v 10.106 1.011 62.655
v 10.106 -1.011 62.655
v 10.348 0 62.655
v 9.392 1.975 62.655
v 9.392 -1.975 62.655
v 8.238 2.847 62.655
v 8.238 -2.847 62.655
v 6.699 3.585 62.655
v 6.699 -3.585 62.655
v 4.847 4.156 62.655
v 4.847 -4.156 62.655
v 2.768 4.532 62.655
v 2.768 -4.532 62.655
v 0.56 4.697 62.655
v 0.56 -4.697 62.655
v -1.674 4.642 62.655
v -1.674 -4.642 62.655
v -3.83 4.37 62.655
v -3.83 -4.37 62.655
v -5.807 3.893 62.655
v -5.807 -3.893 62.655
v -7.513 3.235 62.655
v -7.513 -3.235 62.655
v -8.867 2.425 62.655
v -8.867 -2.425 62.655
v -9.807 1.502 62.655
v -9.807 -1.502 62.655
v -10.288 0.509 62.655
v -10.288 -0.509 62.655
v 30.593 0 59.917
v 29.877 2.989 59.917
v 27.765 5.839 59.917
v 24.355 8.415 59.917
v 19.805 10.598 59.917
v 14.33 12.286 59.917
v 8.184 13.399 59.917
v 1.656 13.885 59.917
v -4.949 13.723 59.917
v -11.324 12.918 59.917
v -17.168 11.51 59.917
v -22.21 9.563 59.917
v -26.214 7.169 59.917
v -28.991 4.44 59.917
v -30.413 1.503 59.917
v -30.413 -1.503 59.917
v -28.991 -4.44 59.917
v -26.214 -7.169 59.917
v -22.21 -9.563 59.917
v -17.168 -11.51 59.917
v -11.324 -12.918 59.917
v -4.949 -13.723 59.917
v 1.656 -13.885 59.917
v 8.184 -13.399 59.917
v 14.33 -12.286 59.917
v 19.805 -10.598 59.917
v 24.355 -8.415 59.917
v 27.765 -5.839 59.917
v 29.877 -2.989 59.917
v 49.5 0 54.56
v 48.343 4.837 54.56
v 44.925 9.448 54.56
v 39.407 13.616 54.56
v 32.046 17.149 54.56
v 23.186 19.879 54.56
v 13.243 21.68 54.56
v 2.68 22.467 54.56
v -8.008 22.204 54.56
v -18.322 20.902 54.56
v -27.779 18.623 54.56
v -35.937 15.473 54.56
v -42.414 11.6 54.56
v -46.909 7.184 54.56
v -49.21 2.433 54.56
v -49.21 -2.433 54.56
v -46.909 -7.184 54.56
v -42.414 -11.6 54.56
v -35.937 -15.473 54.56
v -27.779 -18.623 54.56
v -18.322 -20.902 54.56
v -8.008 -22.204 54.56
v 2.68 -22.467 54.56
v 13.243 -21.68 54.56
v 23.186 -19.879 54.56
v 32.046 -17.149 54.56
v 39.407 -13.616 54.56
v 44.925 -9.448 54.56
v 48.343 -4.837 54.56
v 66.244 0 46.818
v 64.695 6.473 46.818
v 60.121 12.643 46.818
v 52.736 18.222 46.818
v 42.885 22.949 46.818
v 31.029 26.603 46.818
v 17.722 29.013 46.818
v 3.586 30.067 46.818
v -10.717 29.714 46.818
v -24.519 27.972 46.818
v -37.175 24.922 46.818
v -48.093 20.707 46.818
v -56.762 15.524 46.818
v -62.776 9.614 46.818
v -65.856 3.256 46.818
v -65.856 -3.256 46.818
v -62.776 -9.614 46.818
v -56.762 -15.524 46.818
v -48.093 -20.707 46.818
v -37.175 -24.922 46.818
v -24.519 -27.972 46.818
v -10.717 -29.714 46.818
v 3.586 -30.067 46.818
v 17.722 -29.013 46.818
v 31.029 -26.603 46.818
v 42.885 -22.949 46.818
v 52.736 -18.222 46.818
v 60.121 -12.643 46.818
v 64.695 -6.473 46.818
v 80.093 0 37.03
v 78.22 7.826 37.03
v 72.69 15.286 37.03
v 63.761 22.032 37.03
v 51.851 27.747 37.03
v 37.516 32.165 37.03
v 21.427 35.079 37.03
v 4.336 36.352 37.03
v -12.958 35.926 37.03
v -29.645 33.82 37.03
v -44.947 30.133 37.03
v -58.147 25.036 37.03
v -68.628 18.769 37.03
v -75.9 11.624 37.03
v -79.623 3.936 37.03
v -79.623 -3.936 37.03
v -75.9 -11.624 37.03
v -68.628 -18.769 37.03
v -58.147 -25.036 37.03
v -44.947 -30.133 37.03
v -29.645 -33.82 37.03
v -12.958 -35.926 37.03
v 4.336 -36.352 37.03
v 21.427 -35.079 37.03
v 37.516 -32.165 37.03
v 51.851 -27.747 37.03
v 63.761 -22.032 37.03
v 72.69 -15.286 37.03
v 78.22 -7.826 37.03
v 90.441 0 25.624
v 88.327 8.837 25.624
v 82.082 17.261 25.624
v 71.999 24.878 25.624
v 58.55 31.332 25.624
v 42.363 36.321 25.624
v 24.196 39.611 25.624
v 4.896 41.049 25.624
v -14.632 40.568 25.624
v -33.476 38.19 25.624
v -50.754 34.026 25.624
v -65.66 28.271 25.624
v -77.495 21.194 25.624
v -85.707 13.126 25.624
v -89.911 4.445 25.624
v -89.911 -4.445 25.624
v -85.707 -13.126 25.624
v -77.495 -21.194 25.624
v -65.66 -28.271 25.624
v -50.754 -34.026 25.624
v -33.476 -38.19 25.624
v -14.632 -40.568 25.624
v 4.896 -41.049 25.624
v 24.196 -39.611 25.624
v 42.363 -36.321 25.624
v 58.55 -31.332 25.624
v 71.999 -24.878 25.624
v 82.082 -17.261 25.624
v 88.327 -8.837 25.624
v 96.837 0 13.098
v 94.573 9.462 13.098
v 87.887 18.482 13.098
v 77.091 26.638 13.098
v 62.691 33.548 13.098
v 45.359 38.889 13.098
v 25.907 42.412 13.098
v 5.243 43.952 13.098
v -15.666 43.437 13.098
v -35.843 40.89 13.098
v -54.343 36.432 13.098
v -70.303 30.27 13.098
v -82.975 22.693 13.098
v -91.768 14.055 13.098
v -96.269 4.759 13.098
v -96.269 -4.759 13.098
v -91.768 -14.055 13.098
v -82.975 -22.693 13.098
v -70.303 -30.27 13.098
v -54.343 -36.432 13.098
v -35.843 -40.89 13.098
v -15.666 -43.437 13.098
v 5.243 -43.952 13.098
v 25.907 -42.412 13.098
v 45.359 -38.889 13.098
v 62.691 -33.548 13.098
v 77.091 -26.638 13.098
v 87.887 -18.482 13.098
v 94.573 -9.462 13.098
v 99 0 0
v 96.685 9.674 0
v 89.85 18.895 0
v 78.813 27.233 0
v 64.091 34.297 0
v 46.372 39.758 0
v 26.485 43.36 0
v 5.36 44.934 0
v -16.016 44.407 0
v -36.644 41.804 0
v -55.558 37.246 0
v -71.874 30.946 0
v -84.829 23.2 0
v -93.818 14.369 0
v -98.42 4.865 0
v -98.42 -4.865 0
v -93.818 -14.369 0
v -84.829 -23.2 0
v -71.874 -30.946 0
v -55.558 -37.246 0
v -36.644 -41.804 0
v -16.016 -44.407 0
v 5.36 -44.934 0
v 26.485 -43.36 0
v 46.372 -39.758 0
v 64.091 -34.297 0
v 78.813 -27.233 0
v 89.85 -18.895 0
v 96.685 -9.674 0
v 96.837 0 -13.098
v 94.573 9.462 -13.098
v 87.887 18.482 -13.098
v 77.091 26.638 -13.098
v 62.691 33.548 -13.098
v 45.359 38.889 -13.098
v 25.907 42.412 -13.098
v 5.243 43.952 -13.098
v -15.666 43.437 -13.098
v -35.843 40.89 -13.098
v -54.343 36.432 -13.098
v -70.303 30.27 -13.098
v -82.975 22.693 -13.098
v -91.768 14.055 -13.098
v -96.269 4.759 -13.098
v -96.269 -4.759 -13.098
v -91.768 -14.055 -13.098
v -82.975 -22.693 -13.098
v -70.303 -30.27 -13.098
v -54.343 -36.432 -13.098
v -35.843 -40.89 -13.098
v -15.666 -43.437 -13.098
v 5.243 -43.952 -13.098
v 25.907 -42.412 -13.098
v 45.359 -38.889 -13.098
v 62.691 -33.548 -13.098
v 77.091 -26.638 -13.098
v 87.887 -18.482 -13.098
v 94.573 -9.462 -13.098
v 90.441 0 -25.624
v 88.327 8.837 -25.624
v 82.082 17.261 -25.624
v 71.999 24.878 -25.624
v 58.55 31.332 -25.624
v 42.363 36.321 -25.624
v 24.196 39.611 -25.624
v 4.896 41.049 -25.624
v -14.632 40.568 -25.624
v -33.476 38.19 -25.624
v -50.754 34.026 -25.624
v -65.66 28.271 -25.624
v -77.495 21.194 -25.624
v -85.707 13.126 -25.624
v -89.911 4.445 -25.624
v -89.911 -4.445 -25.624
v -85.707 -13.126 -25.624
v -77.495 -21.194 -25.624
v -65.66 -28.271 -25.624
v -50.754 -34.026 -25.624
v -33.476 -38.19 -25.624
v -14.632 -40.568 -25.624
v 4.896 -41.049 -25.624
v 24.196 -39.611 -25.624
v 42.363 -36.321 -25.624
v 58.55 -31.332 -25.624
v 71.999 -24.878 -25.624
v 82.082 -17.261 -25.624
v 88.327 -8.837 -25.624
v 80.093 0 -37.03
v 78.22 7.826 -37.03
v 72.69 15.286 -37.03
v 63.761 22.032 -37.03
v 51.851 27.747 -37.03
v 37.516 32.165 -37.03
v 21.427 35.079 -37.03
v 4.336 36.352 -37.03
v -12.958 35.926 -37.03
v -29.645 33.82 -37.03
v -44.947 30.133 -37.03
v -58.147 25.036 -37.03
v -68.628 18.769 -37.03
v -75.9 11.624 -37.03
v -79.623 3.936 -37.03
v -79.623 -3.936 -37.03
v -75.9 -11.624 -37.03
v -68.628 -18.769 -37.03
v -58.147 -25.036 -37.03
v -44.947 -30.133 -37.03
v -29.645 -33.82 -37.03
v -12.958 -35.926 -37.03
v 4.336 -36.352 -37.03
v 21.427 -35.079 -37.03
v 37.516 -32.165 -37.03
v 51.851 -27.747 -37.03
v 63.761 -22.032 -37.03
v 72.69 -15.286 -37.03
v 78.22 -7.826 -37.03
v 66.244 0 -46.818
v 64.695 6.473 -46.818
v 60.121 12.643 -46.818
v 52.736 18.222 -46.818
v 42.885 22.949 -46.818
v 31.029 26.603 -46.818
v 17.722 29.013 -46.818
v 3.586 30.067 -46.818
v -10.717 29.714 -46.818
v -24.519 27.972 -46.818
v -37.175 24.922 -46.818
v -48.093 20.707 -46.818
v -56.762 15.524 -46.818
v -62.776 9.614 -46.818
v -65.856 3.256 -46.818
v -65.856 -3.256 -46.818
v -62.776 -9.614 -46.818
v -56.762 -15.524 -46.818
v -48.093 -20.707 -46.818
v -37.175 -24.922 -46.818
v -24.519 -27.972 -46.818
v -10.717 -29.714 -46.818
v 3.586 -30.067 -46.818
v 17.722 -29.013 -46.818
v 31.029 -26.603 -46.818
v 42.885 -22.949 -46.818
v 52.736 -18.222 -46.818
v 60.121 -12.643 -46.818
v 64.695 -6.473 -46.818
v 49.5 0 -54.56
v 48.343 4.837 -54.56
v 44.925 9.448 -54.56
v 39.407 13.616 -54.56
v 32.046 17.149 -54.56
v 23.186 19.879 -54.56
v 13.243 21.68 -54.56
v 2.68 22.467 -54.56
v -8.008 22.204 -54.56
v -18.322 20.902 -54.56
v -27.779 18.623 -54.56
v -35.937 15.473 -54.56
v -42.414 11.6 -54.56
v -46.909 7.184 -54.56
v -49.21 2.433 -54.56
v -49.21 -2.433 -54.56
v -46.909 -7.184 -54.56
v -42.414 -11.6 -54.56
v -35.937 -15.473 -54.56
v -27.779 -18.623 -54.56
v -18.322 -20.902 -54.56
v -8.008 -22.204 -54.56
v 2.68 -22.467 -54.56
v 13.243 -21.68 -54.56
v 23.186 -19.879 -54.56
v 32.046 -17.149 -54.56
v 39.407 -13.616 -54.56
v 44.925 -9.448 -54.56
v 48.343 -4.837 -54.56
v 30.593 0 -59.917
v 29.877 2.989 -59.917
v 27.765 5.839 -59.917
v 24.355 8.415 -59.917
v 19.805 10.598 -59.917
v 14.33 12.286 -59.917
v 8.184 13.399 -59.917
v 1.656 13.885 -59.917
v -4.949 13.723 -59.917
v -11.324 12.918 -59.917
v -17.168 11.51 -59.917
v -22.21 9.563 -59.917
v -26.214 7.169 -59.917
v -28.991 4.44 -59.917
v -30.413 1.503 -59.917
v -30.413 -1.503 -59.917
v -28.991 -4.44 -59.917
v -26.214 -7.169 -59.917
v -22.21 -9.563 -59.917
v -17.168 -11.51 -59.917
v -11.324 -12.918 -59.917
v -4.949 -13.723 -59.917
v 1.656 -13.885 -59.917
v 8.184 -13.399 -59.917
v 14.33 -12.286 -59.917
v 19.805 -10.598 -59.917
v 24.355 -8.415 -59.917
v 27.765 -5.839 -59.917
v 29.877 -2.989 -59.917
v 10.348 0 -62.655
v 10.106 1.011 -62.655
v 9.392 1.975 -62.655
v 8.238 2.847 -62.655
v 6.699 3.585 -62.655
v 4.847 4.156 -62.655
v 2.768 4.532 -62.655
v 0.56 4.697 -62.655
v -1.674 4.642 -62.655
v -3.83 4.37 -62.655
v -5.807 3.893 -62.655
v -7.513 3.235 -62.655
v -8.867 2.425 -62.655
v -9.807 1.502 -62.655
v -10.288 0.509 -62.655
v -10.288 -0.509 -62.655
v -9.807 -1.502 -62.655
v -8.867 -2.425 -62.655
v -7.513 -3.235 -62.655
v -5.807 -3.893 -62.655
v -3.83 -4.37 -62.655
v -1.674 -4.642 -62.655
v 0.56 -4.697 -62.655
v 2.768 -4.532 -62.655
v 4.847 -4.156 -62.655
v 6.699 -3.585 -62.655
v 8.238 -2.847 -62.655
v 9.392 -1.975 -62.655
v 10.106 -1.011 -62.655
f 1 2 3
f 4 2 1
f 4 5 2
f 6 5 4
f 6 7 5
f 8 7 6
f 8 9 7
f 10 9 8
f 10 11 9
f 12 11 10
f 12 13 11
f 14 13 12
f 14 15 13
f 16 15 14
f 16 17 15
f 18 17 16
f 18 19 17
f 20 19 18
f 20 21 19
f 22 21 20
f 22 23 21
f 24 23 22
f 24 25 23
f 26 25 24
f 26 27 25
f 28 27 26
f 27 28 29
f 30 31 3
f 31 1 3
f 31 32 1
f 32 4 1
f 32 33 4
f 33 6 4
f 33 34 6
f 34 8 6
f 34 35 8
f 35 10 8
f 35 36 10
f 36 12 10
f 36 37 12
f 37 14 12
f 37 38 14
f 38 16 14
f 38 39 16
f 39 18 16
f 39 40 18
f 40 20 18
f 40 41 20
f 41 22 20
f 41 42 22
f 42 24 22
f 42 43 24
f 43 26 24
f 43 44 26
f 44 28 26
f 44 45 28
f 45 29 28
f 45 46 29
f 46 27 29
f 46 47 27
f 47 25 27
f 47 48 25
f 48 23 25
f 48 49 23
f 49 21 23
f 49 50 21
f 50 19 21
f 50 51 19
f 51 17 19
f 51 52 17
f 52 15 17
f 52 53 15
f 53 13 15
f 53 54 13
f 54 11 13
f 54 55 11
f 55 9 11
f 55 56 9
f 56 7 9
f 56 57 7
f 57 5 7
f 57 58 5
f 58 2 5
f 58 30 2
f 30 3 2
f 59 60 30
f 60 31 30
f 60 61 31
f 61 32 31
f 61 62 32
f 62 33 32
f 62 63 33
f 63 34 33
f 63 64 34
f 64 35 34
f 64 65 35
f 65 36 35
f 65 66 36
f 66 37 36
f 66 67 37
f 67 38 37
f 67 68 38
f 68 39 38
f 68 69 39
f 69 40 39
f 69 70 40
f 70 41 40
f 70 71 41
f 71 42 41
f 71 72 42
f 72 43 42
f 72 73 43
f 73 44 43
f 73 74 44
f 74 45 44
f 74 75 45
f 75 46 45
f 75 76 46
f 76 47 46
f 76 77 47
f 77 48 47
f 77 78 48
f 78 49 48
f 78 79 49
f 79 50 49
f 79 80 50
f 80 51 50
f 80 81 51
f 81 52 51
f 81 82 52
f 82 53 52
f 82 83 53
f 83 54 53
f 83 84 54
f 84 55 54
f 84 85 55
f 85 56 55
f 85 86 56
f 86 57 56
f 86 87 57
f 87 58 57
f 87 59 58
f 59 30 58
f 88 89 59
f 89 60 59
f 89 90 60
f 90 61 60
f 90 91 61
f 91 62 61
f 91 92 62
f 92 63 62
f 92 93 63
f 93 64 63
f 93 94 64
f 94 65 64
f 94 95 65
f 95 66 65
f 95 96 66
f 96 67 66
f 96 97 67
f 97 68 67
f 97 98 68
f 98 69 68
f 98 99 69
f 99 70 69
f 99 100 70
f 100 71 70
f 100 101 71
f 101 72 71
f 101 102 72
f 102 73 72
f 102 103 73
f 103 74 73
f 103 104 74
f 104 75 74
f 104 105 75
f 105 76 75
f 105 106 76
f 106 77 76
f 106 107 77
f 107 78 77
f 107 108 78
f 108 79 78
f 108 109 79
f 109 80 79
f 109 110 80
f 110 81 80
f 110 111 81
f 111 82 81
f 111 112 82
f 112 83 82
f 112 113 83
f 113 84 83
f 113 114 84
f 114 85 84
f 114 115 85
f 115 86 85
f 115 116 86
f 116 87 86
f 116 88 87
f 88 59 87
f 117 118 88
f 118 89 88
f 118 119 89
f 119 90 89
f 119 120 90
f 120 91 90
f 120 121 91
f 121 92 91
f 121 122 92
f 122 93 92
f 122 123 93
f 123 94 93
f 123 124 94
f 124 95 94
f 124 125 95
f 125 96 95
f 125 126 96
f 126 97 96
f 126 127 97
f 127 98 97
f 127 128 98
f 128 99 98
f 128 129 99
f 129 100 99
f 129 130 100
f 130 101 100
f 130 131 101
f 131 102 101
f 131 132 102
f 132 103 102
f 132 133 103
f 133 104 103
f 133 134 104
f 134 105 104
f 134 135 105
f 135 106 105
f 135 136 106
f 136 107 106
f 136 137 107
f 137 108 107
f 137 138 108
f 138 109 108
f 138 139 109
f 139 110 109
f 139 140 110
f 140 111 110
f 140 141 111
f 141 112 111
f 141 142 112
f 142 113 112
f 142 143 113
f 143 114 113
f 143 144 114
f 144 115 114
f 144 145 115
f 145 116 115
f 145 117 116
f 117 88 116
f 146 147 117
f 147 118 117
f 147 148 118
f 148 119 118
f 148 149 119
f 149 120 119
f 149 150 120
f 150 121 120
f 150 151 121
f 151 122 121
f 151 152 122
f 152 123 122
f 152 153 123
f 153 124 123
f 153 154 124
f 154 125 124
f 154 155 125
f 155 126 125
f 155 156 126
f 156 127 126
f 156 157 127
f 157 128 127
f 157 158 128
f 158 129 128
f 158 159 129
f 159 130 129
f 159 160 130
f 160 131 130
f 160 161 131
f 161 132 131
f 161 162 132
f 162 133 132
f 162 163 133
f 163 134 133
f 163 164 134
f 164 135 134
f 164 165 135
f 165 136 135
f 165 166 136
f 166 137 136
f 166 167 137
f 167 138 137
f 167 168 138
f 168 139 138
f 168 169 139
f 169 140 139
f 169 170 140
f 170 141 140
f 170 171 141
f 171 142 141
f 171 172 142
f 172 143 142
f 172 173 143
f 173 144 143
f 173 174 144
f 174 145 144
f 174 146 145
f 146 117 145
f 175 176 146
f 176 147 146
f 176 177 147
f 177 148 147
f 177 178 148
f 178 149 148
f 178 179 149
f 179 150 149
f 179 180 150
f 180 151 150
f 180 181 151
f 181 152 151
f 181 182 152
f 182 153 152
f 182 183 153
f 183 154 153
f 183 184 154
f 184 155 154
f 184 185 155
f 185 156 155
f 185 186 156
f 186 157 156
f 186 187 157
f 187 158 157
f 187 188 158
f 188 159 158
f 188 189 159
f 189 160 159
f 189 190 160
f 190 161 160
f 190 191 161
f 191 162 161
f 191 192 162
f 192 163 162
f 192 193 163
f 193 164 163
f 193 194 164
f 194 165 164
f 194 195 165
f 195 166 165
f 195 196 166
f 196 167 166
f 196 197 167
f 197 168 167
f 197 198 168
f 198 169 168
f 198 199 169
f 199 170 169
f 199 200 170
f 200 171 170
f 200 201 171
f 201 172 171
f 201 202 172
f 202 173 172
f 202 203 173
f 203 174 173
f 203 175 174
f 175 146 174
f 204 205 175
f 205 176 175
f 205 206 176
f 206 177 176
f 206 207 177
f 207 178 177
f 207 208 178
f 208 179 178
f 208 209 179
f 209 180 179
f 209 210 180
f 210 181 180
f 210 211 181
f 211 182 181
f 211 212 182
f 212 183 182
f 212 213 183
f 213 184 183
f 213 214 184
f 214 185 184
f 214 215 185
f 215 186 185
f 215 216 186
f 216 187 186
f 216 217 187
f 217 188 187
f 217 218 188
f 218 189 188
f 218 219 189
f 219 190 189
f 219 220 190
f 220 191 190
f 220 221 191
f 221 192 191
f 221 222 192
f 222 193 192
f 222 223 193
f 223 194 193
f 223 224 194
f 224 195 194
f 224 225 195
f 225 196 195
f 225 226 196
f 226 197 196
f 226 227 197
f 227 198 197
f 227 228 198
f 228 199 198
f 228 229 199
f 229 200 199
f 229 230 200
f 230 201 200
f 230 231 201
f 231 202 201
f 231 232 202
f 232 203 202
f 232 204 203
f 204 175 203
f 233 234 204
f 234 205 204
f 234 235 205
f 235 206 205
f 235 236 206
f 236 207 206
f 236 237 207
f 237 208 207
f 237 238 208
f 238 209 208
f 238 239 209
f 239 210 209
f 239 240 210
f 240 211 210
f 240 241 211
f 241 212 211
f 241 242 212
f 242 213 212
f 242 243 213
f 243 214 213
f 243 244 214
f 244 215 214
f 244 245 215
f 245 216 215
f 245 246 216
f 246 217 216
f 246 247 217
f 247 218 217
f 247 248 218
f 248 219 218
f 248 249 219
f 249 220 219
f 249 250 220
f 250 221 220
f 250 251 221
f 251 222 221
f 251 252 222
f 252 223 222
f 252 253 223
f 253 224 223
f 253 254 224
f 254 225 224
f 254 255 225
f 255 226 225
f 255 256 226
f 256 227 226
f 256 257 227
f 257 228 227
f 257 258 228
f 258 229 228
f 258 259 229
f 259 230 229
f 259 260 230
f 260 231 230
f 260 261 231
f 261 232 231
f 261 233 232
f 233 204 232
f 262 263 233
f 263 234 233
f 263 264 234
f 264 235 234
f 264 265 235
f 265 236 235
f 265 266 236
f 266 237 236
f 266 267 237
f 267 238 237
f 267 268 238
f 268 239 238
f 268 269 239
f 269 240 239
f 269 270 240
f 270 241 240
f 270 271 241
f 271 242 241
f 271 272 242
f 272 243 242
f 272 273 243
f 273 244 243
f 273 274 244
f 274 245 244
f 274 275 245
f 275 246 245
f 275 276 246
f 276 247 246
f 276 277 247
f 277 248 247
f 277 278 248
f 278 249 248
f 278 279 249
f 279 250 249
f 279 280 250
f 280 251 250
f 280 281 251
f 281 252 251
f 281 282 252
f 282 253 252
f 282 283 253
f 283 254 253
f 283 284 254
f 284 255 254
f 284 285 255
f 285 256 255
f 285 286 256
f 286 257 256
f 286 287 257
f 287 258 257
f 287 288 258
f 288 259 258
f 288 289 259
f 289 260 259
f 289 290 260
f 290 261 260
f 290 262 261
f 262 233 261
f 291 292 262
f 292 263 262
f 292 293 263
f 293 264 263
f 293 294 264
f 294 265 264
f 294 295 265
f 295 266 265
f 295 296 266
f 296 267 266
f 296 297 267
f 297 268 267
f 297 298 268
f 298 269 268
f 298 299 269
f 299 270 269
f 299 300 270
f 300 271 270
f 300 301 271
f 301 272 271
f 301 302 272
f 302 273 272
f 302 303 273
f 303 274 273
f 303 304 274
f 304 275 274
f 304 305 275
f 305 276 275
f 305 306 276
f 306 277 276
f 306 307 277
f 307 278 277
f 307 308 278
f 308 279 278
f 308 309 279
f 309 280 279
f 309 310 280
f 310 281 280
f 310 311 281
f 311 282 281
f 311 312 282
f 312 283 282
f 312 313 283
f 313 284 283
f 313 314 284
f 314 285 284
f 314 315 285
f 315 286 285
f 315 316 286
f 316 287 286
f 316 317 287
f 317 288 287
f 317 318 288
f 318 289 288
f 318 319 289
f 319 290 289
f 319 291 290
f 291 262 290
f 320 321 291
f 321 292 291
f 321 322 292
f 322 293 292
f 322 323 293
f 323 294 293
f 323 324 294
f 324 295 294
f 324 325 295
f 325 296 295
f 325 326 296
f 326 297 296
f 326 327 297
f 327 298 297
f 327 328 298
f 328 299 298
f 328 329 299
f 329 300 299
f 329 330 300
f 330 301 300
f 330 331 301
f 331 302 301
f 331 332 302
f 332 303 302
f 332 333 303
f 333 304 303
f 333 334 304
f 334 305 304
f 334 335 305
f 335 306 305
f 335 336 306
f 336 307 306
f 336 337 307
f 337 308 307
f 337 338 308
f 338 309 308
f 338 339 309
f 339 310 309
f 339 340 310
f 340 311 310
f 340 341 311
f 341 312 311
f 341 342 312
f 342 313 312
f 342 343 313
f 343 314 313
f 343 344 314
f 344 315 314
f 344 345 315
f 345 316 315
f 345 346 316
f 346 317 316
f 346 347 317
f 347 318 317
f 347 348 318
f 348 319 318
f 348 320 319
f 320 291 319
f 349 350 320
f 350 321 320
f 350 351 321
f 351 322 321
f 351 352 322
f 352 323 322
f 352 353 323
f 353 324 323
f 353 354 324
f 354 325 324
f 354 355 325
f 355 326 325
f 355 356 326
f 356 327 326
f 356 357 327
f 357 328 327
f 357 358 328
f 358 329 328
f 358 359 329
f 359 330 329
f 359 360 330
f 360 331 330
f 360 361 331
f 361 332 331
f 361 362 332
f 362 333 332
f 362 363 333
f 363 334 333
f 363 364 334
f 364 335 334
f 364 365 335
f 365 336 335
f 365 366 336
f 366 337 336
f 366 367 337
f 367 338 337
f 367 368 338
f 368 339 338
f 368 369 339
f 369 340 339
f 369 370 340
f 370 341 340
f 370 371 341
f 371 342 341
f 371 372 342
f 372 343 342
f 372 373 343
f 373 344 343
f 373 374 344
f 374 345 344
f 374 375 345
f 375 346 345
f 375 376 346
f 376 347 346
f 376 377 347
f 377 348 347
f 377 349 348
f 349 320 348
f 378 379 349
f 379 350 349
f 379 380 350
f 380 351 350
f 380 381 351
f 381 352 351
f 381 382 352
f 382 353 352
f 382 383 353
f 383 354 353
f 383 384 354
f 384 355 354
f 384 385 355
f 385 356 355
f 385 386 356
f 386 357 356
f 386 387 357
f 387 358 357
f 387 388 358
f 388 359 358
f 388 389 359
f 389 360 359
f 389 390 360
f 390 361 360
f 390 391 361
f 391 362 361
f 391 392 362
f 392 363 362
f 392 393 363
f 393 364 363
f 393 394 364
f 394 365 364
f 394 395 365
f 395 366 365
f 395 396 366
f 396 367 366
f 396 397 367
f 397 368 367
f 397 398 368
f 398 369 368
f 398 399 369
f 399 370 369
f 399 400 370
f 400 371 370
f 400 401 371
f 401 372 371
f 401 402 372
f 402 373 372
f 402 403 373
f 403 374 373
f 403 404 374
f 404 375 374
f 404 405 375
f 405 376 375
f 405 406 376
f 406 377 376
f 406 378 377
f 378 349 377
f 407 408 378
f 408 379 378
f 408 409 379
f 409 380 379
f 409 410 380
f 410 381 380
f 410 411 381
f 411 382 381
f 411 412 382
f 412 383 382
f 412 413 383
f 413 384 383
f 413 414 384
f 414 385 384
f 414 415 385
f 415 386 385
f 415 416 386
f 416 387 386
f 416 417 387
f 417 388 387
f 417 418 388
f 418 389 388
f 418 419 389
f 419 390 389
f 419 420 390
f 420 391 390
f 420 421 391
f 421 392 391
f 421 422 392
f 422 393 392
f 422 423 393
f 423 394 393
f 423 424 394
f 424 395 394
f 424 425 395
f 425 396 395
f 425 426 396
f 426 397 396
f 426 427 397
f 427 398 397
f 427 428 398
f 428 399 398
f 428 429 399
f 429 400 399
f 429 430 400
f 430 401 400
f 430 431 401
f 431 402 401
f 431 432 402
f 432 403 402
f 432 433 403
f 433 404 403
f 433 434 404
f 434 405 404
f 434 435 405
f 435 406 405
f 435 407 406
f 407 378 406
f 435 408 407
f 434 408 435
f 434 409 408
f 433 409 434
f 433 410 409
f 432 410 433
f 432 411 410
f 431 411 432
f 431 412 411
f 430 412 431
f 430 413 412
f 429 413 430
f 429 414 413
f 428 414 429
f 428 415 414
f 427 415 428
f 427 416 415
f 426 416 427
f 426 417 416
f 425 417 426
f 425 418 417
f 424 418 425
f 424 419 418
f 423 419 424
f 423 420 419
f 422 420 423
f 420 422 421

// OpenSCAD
// Generated by SolidPython 1.0.1 on 2020-07-29 00:46:49


scale(v = [11, 5, 7]) {
	sphere(r = 9);
}
/***********************************************
*********      SolidPython code:      **********
************************************************
 
# import packages: SolidPython
from solid import *
from solid.utils import *
from itertools import chain, combinations, permutations


class Resize:

    def __init__(self, scad_file):
        self.scad_file = scad_file
        #self.scad_file = import_scad(scad_file)
        # cone/cylinder param:
        self.r1 = 0
        self.r2 = 0
        self.h = 0
        # rectangular prism param:
        self.w = 0
        self.l = 0
        # ellipse param:
        self.r = 0

    # import OpenScad code (file name corresponds to shape)


    # classify shape + parameters
    def assign(self, param1, param2, param3):
        if self.scad_file == 'cone.scad':
            self.r1 = param1
            self.r2 = param2
            self.h = param3
        elif self.scad_file == 'cylinder.scad':
            self.r1 = param1
            self.r2 = param2
            self.h = param3
        elif self.scad_file == 'rectangularPrism.scad':
            self.h = param1
            self.l = param2
            self.w = param3
        else:
            self.r = param1
            self.h = param2

    # resize parameters
    def iterate(self):
        x = range(3, 20, 2)
        i = 1
        if self.scad_file == 'cone.scad':
            tempList = list(permutations(x, 2))
            for temp in tempList:
                param1 = temp[0]
                param2 = temp[1]
                filepath = 'produced_scad_files/' + 'cone' + str(param1) + '_' + str(param2) + '_' + '.scad'
                scad_render_to_file(cylinder(h=param1, r1=param2, r2=0), filepath)

        elif self.scad_file == 'cylinder.scad':
            tempList = list(permutations(x, 3))
            for temp in tempList:
                param1 = temp[0]
                param2 = temp[1]
                filepath = 'produced_scad_files/' + 'cylinder' + str(param1) + '_' + str(param2) + '_' + '.scad'
                scad_render_to_file(cylinder(h=param1, r1=param2, r2=param2), filepath)

        elif self.scad_file == 'rectangularPrism.scad':
            tempList = list(permutations(x, 3))
            for temp in tempList:
                param1 = temp[0]
                param2 = temp[1]
                param3 = temp[2]
                filepath = 'produced_scad_files/' + 'rectangularPrism' + str(param1) + '_' + str(param2) + '_' + str(
                    param3) + '.scad'
                scad_render_to_file(cube(size=(param1, param2, param3)), filepath)

        elif self.scad_file == 'ellipse.scad':
            tempList = list(permutations(x, 4))
            for temp in tempList:
                param1 = temp[0]
                param2 = temp[1]
                param3 = temp[2]
                param4 = temp[3]
                filepath = 'produced_scad_files/' + 'ellipse' + str(param1) + '_' + str(param2) + '_' + str(param3) + '_' + str(param4) + '.scad'
                scad_render_to_file(scale([param1, param2, param3])(sphere(r=param4)), filepath)

    def render_to_scadfile(self):
        scad_render_to_file(scad, 'example.scad') 
 
************************************************/
